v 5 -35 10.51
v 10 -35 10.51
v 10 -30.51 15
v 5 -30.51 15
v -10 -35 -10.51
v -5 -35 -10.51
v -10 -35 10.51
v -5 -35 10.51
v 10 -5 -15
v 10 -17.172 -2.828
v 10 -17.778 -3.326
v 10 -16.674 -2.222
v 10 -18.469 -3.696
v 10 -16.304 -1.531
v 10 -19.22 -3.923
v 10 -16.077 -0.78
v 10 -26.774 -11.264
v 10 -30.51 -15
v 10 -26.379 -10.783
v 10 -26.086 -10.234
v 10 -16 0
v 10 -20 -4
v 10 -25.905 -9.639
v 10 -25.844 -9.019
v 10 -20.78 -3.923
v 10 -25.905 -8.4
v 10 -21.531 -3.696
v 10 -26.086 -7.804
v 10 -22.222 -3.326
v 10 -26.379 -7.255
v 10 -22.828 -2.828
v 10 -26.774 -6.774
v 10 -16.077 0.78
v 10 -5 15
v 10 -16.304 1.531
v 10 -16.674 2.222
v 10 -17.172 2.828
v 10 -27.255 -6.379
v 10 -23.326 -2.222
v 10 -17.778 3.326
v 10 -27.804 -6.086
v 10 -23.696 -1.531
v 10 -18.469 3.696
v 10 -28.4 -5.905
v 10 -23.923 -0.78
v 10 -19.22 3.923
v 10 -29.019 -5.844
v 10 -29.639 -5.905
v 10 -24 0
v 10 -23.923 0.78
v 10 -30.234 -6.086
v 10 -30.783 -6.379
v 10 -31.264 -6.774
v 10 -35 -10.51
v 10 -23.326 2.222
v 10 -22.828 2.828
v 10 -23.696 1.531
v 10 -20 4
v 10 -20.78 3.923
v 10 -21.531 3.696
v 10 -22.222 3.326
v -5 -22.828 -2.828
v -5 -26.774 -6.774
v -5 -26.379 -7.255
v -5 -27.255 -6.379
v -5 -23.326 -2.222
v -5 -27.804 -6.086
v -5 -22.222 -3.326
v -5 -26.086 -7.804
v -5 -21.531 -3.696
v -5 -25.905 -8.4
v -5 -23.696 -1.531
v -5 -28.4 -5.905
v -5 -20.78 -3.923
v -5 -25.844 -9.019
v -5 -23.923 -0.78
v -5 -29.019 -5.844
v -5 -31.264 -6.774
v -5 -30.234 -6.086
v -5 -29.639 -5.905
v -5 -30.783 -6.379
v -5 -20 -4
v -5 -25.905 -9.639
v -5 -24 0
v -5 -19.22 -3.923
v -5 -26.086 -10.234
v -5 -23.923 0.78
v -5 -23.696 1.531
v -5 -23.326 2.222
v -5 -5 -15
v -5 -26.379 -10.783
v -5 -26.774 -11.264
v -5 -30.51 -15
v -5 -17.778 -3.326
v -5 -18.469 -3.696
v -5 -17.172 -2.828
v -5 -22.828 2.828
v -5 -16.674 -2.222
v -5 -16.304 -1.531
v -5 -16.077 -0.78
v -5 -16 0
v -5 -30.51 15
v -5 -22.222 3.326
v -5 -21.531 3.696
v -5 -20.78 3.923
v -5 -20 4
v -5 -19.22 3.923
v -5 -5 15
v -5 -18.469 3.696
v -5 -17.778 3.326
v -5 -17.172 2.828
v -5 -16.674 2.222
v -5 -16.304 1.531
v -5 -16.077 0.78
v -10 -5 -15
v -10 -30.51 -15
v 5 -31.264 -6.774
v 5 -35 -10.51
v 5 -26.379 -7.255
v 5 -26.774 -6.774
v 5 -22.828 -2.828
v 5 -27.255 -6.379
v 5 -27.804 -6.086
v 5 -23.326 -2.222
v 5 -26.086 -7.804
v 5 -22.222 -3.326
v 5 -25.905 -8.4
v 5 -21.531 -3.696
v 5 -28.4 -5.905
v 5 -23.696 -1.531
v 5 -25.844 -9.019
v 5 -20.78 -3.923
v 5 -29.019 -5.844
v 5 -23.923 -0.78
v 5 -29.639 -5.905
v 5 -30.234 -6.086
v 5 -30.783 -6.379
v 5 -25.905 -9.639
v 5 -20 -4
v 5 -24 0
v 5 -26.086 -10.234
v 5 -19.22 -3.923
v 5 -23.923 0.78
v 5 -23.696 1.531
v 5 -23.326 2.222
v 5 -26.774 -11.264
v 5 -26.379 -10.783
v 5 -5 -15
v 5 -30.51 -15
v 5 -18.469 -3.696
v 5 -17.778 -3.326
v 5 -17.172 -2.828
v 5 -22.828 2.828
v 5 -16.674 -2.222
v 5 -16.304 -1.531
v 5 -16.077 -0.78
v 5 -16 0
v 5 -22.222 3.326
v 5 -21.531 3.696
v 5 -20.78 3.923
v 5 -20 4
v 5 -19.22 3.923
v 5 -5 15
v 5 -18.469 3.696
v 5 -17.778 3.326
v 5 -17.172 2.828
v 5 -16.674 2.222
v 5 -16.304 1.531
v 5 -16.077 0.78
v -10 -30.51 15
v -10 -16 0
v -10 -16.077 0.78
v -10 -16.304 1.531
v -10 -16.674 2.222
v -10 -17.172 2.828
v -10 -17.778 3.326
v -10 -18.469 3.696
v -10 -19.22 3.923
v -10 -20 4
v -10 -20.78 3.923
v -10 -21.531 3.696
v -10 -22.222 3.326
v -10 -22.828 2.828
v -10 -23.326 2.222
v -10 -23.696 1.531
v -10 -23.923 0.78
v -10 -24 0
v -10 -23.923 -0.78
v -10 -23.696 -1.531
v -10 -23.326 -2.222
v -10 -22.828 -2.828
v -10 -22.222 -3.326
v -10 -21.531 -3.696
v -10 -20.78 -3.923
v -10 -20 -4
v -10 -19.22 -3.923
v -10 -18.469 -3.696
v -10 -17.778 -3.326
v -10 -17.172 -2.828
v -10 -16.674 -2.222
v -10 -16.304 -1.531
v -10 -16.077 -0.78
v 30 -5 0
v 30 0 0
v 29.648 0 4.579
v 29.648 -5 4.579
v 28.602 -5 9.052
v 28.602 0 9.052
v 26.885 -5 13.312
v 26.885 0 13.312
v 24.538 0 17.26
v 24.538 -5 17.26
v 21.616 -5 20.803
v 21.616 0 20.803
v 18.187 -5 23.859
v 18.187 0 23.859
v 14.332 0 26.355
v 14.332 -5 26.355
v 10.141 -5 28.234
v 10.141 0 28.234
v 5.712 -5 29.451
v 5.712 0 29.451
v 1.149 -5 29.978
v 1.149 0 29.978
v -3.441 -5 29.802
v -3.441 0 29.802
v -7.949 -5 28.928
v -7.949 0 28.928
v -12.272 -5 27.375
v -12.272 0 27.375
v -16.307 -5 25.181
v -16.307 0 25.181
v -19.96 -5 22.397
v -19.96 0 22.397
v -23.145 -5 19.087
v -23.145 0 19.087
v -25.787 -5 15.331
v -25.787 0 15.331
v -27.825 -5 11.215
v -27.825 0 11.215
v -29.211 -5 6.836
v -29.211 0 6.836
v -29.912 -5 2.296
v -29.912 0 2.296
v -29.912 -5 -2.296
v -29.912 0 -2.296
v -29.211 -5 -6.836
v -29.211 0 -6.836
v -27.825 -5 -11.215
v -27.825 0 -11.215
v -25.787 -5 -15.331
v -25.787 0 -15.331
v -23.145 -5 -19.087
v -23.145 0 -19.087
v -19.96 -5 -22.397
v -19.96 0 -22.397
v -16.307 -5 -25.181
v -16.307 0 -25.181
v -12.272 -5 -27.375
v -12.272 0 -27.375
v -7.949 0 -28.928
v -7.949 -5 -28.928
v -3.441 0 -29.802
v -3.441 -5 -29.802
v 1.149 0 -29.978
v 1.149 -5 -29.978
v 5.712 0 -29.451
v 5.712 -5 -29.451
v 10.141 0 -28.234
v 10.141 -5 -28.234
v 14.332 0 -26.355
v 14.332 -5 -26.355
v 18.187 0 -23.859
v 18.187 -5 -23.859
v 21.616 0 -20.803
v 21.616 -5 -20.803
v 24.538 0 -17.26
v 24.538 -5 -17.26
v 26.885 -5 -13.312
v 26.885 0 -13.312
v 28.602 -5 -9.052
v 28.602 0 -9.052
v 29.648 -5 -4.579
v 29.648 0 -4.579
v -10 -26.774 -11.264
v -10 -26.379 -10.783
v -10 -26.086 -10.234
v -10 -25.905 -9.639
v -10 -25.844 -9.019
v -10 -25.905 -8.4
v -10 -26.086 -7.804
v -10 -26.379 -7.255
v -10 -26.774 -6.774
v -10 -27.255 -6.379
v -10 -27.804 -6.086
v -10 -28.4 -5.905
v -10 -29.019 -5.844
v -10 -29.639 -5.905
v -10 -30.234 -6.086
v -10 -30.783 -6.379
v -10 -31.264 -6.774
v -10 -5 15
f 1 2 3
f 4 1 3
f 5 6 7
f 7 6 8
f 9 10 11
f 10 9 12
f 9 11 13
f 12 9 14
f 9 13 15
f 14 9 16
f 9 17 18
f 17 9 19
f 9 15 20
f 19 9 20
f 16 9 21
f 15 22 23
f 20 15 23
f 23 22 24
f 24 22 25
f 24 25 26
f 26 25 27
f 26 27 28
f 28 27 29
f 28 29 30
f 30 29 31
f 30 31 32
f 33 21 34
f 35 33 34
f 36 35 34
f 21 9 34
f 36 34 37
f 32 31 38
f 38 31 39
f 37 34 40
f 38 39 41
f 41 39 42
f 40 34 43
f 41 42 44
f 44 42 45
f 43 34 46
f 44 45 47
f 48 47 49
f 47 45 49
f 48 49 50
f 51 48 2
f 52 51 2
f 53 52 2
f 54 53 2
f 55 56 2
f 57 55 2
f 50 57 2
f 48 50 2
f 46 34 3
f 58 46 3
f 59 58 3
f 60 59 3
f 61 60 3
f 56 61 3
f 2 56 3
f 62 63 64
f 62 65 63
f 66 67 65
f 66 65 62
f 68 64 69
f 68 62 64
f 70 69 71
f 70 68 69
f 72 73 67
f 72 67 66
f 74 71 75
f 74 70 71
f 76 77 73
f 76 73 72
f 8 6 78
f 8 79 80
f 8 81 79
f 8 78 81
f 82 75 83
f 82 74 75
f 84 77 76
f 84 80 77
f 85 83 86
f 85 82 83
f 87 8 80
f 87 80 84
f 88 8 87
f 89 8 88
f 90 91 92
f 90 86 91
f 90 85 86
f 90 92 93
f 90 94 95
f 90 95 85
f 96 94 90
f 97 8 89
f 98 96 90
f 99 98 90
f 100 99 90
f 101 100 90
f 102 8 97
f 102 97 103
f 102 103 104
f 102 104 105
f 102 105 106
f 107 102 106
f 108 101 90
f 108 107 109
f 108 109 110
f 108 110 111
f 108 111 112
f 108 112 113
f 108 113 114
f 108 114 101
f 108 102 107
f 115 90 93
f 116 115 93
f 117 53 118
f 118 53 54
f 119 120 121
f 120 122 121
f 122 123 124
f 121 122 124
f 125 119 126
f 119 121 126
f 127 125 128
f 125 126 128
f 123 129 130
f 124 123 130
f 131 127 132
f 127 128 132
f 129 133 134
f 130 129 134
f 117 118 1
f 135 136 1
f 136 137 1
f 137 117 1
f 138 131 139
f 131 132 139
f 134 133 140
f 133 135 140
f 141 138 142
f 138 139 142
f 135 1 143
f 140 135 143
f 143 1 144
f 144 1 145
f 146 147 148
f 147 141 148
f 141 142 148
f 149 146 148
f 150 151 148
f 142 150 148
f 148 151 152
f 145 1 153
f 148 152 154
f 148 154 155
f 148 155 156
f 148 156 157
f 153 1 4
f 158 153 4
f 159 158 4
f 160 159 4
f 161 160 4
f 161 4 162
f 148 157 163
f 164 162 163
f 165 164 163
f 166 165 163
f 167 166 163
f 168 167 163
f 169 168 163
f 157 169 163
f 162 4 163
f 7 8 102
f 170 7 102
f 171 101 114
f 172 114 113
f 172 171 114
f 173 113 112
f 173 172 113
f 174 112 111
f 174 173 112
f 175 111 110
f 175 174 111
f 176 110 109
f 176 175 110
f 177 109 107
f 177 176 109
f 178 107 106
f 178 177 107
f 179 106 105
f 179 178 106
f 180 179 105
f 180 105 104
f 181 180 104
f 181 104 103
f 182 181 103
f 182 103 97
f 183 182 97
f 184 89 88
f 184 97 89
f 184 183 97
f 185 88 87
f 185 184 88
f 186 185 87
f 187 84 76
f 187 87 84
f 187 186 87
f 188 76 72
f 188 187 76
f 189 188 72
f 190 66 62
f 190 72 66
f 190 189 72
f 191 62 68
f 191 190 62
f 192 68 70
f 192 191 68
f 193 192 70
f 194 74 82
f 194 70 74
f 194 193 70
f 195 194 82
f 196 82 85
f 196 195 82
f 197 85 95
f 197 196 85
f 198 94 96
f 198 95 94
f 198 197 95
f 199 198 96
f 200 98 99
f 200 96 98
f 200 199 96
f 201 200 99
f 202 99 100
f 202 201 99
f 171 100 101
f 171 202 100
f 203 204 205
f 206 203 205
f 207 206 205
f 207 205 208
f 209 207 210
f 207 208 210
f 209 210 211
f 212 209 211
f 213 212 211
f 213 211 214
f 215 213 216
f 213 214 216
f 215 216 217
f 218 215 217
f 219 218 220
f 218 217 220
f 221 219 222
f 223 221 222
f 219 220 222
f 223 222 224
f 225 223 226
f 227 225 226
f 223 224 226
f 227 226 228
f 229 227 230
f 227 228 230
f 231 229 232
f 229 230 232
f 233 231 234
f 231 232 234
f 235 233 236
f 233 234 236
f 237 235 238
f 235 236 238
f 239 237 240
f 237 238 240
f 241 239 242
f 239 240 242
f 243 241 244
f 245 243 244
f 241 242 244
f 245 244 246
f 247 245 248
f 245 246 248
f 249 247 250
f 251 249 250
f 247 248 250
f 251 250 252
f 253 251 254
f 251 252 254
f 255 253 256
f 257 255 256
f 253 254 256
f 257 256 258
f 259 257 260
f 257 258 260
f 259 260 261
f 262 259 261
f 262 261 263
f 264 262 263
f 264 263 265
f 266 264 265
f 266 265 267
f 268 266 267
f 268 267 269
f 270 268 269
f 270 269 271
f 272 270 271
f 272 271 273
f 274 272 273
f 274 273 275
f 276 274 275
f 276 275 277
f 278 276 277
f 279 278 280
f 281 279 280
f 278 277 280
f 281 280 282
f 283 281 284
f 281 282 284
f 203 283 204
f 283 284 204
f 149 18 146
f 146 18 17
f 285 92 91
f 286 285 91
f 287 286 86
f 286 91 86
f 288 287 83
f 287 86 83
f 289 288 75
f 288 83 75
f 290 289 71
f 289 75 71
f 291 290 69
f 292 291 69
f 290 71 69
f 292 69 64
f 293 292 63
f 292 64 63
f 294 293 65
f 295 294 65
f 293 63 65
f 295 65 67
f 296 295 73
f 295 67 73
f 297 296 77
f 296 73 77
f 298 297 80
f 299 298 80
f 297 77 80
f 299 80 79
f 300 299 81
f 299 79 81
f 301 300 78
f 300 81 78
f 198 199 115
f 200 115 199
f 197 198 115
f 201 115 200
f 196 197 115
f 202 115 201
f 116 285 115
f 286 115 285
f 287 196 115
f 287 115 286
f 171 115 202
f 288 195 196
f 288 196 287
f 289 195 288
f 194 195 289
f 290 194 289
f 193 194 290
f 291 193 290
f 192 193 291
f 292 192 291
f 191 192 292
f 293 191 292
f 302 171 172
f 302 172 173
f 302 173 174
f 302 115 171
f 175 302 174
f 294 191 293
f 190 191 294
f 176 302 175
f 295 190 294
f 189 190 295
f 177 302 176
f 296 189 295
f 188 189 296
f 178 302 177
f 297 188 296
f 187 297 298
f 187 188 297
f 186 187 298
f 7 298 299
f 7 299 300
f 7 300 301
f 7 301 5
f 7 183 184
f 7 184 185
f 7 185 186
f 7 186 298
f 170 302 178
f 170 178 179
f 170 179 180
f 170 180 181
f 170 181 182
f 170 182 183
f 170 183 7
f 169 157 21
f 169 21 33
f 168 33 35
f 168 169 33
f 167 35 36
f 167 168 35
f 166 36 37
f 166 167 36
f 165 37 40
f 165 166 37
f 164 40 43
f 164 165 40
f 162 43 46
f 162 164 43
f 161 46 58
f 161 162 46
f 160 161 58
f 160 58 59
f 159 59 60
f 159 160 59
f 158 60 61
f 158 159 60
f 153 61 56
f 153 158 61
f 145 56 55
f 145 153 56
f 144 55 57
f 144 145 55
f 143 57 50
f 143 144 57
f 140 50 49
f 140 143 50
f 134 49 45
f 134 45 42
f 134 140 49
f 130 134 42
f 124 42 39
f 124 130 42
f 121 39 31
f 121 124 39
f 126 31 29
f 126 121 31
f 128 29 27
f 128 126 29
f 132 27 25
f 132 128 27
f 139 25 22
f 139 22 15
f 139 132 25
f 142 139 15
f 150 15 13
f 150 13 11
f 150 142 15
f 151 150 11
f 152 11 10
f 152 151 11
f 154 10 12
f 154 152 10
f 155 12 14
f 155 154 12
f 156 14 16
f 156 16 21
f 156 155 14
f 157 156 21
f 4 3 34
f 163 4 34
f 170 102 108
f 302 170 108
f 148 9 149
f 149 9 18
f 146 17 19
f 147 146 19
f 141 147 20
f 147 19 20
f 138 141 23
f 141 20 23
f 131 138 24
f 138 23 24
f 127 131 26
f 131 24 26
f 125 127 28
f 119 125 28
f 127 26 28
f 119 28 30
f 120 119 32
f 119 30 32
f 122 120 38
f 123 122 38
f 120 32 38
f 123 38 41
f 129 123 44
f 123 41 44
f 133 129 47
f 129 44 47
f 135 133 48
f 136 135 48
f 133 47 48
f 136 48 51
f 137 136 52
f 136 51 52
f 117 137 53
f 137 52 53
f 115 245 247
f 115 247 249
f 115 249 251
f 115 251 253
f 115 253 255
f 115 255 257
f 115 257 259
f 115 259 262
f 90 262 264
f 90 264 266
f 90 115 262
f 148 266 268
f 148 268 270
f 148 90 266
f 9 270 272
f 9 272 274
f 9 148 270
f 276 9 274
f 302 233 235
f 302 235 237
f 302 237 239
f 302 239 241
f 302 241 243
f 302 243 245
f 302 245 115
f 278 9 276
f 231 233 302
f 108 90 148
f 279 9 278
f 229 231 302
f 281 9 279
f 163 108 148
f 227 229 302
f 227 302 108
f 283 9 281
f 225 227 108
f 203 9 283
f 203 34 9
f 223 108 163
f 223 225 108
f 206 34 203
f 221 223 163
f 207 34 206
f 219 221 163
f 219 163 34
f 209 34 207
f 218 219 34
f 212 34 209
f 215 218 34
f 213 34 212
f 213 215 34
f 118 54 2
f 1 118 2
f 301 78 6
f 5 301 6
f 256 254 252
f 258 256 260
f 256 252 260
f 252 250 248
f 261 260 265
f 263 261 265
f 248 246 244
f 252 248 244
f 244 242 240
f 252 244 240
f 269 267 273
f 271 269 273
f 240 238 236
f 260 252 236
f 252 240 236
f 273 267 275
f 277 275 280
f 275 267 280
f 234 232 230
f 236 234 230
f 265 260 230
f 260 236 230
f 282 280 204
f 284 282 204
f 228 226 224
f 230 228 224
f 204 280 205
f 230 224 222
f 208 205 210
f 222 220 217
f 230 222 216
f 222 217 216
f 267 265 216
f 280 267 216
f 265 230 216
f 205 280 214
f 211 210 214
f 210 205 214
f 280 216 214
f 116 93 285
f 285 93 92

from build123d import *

# Parameters (mm, degrees)
SKETCH001_R  = 30
PAD_DEPTH    = 5
SKETCH_R     = 4
PAD001_DEPTH = 10
SKETCH002_W  = 10
SKETCH002_H  = 30
POCKET_DEPTH = 15


with BuildPart() as part:
    # Sketch001 → Pad (new body)
    with BuildSketch(Plane.XZ):
        Circle(SKETCH001_R)
    extrude(amount=PAD_DEPTH)

    # Sketch → Pad001 (join, symmetric)
    with BuildSketch(Plane.YZ):
        with BuildLine():
            ThreePointArc((-26.774038, -11.264166), (-26.774038, -6.774038), (-31.264166, -6.774038))
            Line((-31.264166, -6.774038), (-35, -10.509872))
            Line((-35, -10.509872), (-35, 10.509872))
            Line((-35, 10.509872), (-30.509872, 15))
            Line((-30.509872, 15), (-0.1, 15))
            Line((-0.1, 15), (-0.1, -15))
            Line((-0.1, -15), (-30.509872, -15))
            Line((-30.509872, -15), (-26.774038, -11.264166))
        make_face()
        with Locations((-20, 0)):
            Circle(SKETCH_R, mode=Mode.SUBTRACT)
    extrude(amount=PAD001_DEPTH, both=True)

    # Sketch002 → Pocket (cut, symmetric)
    with BuildSketch(Plane.XY):
        with Locations((0, -20)):
            Rectangle(SKETCH002_W, SKETCH002_H)
    extrude(amount=POCKET_DEPTH, both=True, mode=Mode.SUBTRACT)


solid = part.part
